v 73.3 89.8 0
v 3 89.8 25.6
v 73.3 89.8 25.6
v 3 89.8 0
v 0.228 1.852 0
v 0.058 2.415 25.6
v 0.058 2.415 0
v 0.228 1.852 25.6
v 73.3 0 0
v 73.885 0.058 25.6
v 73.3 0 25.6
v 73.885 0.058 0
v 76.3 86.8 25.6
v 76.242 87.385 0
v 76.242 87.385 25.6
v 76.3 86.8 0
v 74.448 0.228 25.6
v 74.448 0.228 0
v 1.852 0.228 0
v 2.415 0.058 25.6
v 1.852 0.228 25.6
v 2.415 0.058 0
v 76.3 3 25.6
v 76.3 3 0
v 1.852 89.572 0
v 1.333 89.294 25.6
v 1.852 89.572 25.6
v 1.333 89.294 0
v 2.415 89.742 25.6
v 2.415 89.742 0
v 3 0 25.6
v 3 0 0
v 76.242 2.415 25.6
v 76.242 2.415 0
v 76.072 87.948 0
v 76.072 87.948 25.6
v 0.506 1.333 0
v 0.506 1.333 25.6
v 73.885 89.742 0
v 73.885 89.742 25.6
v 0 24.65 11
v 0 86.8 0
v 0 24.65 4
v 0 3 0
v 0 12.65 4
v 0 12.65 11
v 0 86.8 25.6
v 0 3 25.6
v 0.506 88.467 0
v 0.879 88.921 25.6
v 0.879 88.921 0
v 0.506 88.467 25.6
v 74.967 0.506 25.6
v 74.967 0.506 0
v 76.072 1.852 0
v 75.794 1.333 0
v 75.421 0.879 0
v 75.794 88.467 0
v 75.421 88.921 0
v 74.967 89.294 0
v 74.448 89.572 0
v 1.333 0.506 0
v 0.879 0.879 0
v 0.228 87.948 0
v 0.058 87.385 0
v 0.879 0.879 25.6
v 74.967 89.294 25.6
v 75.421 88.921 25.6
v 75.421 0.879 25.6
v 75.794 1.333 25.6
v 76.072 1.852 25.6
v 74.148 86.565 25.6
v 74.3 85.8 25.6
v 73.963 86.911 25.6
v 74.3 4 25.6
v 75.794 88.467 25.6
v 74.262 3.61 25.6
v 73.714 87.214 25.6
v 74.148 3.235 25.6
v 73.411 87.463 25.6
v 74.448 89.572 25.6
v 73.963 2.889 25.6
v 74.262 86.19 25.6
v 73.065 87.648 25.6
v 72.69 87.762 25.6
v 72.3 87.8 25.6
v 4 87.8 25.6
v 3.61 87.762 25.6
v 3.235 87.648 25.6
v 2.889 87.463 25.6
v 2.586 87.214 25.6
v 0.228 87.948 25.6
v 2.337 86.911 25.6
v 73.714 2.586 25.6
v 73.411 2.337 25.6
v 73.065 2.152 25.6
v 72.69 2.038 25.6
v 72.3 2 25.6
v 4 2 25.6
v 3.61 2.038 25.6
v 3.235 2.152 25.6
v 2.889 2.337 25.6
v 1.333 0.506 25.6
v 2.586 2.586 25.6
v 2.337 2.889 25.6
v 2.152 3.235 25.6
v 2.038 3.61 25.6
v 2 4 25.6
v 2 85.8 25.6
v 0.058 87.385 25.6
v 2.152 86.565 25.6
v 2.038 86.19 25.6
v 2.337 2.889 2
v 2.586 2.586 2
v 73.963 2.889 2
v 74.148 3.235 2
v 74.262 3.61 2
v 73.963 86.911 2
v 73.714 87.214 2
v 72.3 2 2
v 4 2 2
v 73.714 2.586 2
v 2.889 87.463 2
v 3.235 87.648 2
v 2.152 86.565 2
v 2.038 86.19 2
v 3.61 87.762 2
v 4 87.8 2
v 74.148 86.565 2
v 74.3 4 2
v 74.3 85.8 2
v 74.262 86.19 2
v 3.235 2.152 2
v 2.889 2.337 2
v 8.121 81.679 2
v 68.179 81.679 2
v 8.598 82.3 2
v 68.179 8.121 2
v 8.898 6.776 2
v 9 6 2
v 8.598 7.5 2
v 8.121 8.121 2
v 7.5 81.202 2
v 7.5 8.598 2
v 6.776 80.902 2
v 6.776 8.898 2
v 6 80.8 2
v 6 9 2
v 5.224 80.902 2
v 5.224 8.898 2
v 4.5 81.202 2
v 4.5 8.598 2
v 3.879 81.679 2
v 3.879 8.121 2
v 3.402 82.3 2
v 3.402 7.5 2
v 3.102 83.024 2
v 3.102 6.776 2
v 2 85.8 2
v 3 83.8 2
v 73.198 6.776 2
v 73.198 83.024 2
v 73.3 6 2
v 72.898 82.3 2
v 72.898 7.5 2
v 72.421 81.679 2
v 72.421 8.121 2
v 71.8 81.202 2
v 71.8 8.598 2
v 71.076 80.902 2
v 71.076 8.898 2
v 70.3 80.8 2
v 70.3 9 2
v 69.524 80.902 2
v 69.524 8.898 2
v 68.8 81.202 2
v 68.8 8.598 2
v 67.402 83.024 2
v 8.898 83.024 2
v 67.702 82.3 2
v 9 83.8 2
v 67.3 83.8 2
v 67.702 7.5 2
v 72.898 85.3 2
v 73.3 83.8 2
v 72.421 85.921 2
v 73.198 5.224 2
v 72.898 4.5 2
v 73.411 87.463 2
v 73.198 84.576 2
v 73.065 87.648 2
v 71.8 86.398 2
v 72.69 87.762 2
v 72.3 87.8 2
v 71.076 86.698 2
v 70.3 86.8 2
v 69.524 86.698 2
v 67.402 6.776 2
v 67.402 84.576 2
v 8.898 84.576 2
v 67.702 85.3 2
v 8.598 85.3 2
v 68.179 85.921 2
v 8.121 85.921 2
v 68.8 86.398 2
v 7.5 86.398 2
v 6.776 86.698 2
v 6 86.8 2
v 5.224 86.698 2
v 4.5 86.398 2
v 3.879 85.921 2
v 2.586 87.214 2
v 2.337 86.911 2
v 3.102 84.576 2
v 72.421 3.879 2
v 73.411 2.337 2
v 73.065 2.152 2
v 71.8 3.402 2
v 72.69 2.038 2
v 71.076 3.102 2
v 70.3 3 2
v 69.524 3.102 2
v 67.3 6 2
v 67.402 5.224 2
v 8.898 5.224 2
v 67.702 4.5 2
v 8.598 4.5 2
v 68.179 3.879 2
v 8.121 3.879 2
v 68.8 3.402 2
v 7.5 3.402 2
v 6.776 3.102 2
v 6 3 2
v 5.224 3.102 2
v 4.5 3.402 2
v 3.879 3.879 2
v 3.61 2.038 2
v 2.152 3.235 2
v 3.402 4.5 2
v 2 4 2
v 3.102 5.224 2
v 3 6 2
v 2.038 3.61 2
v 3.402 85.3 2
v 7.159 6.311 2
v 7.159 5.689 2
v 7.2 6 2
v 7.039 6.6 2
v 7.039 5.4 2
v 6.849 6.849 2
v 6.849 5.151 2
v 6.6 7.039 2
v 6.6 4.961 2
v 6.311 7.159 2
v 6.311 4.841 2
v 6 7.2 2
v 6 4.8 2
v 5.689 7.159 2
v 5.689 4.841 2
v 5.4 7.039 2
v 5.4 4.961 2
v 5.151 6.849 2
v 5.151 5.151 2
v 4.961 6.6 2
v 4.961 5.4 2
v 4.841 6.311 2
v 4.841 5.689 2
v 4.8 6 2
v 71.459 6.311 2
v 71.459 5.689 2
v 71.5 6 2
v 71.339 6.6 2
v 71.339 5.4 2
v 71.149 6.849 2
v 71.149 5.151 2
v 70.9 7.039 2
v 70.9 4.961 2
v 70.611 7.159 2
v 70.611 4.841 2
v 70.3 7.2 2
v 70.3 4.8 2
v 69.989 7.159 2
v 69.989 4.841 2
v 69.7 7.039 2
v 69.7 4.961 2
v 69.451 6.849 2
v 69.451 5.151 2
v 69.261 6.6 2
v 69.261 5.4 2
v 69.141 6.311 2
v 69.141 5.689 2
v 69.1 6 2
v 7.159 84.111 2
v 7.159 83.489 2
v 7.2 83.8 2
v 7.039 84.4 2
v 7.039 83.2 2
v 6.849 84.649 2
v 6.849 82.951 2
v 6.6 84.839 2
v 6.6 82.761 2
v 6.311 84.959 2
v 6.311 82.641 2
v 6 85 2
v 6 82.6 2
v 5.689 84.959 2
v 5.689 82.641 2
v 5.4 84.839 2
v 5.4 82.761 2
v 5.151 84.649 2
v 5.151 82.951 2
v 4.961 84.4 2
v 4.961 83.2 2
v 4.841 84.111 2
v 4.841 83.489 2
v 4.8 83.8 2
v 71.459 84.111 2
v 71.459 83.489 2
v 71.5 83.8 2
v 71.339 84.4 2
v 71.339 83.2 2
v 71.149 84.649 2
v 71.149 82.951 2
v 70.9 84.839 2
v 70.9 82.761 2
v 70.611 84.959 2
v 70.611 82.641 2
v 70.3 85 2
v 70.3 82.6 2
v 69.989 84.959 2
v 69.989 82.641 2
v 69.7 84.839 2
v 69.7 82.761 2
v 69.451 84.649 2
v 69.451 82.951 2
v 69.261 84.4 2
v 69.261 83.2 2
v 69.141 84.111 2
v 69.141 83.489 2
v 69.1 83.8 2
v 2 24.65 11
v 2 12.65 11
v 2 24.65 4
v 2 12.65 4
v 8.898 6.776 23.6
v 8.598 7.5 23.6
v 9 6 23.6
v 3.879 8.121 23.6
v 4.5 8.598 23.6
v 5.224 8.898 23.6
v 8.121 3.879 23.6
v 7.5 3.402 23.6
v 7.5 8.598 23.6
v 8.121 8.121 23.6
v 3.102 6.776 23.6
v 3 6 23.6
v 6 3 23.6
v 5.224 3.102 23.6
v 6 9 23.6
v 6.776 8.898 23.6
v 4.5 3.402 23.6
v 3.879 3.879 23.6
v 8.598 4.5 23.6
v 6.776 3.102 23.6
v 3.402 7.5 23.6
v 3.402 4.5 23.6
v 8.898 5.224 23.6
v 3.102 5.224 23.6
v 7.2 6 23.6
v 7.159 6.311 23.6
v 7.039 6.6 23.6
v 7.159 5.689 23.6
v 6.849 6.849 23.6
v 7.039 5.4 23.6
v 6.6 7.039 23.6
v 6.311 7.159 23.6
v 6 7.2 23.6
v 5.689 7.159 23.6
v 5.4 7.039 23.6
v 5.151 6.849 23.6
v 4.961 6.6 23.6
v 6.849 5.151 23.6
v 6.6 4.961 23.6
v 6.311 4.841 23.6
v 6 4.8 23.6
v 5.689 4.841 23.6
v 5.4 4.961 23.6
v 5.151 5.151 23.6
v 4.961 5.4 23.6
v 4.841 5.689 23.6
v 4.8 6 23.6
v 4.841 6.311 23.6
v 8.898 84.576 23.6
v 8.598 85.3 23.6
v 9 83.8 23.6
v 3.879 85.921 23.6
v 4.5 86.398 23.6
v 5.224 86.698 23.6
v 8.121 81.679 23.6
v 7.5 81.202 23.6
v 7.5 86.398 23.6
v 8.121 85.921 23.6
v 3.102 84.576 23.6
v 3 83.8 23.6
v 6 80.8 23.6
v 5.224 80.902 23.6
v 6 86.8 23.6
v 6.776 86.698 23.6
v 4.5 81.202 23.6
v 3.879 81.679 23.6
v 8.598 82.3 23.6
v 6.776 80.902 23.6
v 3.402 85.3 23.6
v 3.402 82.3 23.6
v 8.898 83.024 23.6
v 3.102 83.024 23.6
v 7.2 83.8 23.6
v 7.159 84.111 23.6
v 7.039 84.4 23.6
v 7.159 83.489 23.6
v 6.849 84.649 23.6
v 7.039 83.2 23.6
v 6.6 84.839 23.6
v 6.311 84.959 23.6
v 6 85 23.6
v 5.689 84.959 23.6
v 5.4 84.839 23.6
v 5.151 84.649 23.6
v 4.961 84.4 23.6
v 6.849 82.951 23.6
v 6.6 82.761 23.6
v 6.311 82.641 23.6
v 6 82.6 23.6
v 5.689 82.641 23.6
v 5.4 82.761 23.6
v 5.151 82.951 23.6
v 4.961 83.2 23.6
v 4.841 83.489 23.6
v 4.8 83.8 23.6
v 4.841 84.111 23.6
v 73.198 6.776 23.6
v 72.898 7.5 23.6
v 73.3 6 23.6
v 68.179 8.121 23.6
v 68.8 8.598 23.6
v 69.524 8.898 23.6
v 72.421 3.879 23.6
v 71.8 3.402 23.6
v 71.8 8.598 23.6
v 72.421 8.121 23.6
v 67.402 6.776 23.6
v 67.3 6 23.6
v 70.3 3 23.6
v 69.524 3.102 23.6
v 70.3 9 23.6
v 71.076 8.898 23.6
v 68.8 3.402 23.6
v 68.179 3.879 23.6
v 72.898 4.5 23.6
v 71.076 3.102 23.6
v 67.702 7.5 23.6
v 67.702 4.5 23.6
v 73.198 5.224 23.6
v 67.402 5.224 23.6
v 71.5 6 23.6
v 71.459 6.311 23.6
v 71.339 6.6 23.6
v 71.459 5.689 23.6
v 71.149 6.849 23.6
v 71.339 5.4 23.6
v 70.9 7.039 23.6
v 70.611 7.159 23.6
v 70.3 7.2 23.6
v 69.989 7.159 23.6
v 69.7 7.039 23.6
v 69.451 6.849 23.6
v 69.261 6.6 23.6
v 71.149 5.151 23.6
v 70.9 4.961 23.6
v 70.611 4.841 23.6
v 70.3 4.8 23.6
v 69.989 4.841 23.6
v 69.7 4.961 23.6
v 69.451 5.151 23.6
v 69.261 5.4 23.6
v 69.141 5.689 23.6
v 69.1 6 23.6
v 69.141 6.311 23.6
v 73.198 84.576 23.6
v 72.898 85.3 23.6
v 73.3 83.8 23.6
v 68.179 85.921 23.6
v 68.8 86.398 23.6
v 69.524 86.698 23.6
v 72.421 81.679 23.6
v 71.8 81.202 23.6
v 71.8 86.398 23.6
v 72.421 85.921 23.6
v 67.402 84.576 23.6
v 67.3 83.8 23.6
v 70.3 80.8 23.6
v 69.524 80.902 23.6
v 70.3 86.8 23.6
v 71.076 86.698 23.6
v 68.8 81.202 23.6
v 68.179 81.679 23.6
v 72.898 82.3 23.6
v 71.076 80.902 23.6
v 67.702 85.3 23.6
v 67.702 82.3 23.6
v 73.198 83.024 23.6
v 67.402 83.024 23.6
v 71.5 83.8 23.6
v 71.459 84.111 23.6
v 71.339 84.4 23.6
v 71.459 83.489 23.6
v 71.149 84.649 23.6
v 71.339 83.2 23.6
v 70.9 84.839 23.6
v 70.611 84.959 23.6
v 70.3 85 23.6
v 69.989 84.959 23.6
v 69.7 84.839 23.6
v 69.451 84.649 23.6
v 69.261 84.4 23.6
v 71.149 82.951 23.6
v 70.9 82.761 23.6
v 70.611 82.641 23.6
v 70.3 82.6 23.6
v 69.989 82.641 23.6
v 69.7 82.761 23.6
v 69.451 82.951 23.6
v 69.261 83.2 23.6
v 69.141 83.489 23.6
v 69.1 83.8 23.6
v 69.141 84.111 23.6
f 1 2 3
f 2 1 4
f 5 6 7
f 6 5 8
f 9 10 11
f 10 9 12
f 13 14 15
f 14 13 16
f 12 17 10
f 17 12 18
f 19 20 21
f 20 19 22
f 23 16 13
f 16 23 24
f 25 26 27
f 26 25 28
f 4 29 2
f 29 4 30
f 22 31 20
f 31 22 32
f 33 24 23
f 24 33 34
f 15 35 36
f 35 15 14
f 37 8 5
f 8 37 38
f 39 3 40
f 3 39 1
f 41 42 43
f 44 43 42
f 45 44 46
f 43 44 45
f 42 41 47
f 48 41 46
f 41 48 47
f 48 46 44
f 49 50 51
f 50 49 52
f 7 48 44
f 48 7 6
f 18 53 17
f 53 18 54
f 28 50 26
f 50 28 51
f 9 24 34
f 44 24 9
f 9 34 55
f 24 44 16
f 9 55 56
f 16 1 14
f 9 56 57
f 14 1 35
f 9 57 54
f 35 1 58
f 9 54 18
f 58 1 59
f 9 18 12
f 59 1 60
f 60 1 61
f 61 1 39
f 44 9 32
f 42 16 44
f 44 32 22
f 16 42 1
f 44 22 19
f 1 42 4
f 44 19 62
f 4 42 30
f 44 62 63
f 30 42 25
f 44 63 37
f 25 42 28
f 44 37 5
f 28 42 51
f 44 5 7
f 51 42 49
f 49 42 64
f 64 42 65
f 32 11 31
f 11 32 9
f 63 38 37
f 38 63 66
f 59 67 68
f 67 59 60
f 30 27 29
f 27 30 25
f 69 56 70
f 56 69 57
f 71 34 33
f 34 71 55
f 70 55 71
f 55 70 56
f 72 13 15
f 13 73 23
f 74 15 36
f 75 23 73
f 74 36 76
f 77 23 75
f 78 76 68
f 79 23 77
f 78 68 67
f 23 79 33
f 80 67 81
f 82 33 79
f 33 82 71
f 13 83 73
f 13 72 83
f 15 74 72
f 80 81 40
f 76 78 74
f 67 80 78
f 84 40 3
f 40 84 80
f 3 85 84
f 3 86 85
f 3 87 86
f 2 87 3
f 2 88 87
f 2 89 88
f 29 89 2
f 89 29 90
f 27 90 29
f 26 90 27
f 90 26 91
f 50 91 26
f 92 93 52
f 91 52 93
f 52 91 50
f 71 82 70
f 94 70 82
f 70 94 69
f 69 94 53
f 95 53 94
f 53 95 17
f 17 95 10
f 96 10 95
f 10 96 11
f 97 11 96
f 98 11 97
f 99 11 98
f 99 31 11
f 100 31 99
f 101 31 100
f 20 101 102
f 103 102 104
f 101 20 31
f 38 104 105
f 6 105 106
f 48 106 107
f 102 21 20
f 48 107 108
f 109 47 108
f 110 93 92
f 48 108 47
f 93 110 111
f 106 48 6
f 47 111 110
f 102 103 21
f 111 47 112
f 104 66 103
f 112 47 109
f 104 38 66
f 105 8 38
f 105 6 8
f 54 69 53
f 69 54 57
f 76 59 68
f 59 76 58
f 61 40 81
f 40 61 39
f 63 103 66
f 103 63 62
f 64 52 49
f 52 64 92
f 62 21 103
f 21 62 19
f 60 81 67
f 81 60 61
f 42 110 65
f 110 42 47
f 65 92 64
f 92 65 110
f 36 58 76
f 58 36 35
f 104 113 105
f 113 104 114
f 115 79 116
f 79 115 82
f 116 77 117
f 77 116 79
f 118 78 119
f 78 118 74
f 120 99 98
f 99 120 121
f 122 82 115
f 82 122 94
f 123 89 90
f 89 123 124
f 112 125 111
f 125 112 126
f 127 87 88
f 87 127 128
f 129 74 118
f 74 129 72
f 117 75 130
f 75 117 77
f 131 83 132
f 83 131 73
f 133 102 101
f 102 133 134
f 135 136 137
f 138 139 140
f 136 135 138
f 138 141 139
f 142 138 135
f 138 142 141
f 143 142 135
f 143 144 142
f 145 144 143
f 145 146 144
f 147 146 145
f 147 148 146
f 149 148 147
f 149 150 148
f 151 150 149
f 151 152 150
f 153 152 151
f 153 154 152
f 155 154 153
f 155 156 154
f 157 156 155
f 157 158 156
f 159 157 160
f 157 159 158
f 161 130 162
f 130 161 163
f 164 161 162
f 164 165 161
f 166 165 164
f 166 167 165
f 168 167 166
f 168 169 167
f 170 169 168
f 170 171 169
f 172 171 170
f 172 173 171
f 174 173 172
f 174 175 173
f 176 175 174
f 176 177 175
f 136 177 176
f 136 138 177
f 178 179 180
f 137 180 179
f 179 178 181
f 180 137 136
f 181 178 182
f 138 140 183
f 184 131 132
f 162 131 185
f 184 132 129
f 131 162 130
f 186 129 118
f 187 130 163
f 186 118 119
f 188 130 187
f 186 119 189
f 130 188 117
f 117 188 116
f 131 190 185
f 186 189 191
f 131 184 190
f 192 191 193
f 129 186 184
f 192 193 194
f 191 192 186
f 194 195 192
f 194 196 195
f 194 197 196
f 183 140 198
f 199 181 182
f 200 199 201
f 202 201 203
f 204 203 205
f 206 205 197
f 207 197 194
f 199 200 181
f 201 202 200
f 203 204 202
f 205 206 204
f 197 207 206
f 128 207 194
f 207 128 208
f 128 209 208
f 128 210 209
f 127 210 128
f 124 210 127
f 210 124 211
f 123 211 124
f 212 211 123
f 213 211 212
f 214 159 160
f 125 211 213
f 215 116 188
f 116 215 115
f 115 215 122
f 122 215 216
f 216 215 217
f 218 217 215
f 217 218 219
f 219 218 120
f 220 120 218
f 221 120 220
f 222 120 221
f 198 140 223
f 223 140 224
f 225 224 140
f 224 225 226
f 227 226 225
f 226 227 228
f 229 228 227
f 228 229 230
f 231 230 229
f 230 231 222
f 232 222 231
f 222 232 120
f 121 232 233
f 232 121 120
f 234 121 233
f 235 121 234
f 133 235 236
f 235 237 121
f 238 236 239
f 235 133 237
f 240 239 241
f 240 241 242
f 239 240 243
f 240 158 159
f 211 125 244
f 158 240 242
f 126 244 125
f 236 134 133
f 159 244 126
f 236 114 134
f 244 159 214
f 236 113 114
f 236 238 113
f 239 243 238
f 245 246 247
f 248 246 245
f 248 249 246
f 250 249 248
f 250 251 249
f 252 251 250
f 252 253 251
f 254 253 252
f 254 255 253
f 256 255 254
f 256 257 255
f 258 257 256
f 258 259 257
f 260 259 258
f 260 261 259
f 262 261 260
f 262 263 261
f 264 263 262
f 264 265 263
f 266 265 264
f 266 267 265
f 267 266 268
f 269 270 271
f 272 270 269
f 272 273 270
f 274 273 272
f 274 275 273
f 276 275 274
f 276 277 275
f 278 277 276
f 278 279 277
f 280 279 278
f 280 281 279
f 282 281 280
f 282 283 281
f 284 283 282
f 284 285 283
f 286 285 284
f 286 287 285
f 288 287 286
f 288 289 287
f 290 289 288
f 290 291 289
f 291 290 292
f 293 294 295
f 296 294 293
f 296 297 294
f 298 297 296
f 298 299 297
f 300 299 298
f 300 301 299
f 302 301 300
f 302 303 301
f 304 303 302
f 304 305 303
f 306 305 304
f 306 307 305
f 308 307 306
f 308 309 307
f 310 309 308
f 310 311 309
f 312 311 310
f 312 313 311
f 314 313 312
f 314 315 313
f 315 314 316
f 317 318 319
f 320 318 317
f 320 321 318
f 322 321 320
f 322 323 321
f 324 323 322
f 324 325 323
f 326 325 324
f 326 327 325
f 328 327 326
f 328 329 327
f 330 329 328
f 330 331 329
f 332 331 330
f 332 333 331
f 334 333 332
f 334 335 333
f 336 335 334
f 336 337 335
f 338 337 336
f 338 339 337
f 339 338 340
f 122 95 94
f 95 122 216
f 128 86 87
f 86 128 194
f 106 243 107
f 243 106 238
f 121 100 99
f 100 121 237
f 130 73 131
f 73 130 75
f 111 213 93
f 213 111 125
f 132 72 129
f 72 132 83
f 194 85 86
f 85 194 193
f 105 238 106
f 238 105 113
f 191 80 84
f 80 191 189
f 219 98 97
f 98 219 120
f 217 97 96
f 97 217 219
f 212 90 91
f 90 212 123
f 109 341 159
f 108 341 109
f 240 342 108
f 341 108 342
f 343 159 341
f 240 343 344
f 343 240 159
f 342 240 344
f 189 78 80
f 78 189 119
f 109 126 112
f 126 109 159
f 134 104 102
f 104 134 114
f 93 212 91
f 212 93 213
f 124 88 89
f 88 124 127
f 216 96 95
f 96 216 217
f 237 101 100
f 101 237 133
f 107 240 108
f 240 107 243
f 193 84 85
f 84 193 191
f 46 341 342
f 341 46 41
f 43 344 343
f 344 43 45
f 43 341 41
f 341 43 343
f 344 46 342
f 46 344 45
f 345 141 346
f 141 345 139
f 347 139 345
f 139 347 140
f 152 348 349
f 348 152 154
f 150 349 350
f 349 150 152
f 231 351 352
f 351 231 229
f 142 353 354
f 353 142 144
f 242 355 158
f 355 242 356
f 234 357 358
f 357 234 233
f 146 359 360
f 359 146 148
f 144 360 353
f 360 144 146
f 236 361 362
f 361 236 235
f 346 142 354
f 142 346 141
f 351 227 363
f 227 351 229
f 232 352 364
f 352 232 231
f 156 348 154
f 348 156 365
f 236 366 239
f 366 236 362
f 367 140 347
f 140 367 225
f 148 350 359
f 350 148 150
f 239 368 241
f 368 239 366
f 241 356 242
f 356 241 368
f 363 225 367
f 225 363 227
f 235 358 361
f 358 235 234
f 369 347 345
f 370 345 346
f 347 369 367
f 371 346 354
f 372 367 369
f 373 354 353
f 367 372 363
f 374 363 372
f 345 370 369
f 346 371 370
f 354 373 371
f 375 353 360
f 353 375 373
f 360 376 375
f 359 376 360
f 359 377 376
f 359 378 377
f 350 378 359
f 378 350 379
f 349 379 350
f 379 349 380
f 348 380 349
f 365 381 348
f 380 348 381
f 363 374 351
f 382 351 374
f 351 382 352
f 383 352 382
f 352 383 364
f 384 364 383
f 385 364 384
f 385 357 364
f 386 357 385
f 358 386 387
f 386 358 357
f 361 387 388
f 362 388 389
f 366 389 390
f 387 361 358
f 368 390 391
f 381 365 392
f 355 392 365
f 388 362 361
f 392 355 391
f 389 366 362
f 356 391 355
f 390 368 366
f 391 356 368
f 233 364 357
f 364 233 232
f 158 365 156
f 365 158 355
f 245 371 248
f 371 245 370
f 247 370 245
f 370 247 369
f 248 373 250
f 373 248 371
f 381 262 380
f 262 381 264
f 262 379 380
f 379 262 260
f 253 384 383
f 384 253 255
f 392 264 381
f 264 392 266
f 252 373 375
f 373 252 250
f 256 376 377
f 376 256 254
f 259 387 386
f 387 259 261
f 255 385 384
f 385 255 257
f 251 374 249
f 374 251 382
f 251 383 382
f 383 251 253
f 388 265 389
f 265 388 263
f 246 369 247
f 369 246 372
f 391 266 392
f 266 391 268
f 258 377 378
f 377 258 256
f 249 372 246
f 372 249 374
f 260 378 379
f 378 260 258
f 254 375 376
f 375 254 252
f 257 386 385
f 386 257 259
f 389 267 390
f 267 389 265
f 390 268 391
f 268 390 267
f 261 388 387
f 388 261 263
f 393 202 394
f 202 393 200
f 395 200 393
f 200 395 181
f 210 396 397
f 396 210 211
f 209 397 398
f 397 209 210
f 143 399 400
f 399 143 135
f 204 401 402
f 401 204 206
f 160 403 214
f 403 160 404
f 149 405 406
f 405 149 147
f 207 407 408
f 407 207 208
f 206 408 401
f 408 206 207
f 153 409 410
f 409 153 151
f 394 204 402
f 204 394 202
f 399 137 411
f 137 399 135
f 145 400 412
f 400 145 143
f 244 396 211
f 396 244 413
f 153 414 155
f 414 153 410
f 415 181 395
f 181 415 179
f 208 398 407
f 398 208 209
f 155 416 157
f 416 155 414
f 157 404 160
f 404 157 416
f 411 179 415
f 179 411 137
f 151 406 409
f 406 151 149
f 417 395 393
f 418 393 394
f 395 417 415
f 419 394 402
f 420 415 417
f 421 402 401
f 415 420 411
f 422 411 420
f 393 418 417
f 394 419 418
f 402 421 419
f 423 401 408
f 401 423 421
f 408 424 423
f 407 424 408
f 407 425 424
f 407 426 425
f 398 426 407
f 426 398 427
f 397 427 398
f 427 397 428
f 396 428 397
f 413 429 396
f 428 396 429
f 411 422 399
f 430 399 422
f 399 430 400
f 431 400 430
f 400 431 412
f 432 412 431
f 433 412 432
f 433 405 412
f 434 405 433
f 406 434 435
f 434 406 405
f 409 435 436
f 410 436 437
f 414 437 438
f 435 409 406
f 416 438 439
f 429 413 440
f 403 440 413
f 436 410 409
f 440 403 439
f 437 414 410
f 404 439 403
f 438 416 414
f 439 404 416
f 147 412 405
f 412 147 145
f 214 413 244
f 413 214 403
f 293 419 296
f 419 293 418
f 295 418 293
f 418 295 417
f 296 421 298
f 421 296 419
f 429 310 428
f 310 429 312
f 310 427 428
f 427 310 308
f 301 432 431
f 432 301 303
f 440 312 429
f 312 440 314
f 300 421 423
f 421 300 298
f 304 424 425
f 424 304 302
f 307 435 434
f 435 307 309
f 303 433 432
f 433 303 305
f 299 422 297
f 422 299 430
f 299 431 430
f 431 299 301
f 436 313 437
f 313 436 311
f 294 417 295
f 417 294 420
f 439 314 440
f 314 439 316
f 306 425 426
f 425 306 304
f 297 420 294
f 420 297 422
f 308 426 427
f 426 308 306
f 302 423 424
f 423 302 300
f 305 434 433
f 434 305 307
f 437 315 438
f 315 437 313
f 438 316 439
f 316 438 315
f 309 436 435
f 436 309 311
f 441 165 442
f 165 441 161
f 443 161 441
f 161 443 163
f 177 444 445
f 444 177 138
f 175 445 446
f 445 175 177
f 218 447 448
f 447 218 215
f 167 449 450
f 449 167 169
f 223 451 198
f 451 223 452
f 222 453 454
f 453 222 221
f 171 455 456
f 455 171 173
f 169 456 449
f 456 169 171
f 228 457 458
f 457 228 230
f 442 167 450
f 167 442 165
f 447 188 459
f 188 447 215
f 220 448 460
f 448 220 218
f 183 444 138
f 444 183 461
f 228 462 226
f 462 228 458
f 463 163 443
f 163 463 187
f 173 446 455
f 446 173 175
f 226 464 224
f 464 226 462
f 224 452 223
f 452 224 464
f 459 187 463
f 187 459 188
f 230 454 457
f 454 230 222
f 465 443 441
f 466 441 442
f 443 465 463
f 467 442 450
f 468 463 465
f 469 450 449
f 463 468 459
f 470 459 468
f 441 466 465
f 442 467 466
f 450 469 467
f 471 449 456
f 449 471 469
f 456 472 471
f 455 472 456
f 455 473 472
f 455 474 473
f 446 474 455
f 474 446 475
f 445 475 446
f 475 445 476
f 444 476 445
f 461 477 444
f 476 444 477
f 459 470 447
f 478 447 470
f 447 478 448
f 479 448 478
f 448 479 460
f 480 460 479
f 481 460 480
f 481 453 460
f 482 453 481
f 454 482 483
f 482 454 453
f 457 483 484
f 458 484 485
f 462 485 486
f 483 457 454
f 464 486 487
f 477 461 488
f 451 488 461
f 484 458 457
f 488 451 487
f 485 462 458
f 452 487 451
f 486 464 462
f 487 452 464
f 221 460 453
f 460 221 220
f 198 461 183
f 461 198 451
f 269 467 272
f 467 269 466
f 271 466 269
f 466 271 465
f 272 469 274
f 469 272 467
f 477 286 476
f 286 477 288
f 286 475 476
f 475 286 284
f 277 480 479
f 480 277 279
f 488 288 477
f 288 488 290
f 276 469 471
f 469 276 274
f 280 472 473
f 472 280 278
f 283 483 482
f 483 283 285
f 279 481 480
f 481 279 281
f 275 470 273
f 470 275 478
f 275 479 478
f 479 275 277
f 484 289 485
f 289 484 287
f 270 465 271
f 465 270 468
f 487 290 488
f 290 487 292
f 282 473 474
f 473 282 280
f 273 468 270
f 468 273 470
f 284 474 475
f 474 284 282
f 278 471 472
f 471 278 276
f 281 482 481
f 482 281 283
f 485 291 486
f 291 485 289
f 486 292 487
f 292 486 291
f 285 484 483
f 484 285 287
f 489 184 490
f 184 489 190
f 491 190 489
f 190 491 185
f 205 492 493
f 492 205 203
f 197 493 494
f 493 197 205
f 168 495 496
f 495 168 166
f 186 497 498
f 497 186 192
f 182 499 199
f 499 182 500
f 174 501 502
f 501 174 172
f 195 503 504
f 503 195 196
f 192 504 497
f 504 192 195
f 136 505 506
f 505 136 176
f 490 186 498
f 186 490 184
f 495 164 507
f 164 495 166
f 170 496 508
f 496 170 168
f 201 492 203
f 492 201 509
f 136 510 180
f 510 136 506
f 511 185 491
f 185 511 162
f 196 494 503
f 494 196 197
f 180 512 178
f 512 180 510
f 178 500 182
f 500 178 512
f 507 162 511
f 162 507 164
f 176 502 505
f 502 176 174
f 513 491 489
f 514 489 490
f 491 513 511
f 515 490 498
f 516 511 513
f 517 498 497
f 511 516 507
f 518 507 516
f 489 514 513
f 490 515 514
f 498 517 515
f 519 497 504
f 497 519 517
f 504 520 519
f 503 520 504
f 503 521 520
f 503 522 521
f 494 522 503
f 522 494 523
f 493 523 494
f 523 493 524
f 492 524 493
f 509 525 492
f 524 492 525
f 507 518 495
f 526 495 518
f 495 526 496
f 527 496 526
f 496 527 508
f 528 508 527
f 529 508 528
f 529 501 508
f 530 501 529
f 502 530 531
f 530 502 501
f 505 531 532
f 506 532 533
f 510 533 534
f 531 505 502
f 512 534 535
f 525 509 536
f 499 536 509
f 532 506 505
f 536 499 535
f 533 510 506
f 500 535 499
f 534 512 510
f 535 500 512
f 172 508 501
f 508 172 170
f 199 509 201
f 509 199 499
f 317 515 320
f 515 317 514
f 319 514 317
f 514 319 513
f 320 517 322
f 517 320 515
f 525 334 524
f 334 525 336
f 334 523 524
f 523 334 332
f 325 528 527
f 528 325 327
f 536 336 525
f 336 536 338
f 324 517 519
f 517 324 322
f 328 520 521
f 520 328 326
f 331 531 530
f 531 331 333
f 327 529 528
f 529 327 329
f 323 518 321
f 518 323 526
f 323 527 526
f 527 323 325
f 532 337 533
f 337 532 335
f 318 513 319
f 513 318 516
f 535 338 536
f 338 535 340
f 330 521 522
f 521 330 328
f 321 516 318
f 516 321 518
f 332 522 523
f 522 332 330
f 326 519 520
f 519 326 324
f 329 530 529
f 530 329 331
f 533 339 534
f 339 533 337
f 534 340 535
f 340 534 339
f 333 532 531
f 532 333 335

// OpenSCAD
// Waze HUD – parametric enclosure (UNTESTED starting point). Units: mm.
// Measure your modules and edit the variables below.
part = "base";          // "base" or "lid"

// --- ILI9341 2.4" module (PCB) ---
pcb_w = 71.5;           // PCB width
pcb_h = 52.5;           // PCB height
pcb_t = 1.6;            // PCB thickness
win_w = 49.0;           // visible window width (active area ~48.96)
win_h = 37.0;           // visible window height (active area ~36.72)
win_dx = 0;             // window offset from PCB centre (x)
win_dy = 1.5;           // window offset from PCB centre (y)

// --- ESP32 DevKit V1 ---
esp_l = 52.0;
esp_w = 28.5;
esp_h = 14.0;           // incl. headers + USB connector

// --- Box ---
wall = 2.0;
gap = 0.4;              // clearance
depth_front = 8;        // space between lid and PCB
inner_w = pcb_w + 2*gap;
inner_h = pcb_h + 2*gap + esp_w + 4;   // PCB on top, ESP32 below
inner_d = depth_front + pcb_t + esp_h;
usb_w = 12; usb_h = 7;  // micro-USB cut-out

module rounded(w, h, d, r=3) {
  hull() for (x=[r, w-r], y=[r, h-r]) translate([x, y, 0]) cylinder(r=r, h=d, $fn=32);
}

module base() {
  difference() {
    rounded(inner_w + 2*wall, inner_h + 2*wall, inner_d + wall);
    translate([wall, wall, wall]) rounded(inner_w, inner_h, inner_d + 1, 2);
    // micro-USB opening on the short side, ESP32 compartment
    translate([-1, wall + (esp_w + 4 - usb_w)/2 + gap, wall + 2]) cube([wall + 2, usb_w, usb_h]);
  }
  // four screw posts
  for (x=[wall+4, inner_w+wall-4], y=[wall+4, inner_h+wall-4])
    translate([x, y, wall]) difference() { cylinder(d=6, h=inner_d - 2, $fn=24); cylinder(d=2.4, h=inner_d, $fn=24); }
}

module lid() {
  difference() {
    rounded(inner_w + 2*wall, inner_h + 2*wall, wall);
    // display window, PCB sits in the upper part of the box
    translate([wall + inner_w/2 + win_dx - win_w/2,
               wall + (esp_w + 4) + (pcb_h + 2*gap)/2 + win_dy - win_h/2,
               -1]) cube([win_w, win_h, wall + 2]);
    for (x=[wall+4, inner_w+wall-4], y=[wall+4, inner_h+wall-4])
      translate([x, y, -1]) cylinder(d=3.2, h=wall + 2, $fn=24);
  }
}

if (part == "base") base(); else lid();
